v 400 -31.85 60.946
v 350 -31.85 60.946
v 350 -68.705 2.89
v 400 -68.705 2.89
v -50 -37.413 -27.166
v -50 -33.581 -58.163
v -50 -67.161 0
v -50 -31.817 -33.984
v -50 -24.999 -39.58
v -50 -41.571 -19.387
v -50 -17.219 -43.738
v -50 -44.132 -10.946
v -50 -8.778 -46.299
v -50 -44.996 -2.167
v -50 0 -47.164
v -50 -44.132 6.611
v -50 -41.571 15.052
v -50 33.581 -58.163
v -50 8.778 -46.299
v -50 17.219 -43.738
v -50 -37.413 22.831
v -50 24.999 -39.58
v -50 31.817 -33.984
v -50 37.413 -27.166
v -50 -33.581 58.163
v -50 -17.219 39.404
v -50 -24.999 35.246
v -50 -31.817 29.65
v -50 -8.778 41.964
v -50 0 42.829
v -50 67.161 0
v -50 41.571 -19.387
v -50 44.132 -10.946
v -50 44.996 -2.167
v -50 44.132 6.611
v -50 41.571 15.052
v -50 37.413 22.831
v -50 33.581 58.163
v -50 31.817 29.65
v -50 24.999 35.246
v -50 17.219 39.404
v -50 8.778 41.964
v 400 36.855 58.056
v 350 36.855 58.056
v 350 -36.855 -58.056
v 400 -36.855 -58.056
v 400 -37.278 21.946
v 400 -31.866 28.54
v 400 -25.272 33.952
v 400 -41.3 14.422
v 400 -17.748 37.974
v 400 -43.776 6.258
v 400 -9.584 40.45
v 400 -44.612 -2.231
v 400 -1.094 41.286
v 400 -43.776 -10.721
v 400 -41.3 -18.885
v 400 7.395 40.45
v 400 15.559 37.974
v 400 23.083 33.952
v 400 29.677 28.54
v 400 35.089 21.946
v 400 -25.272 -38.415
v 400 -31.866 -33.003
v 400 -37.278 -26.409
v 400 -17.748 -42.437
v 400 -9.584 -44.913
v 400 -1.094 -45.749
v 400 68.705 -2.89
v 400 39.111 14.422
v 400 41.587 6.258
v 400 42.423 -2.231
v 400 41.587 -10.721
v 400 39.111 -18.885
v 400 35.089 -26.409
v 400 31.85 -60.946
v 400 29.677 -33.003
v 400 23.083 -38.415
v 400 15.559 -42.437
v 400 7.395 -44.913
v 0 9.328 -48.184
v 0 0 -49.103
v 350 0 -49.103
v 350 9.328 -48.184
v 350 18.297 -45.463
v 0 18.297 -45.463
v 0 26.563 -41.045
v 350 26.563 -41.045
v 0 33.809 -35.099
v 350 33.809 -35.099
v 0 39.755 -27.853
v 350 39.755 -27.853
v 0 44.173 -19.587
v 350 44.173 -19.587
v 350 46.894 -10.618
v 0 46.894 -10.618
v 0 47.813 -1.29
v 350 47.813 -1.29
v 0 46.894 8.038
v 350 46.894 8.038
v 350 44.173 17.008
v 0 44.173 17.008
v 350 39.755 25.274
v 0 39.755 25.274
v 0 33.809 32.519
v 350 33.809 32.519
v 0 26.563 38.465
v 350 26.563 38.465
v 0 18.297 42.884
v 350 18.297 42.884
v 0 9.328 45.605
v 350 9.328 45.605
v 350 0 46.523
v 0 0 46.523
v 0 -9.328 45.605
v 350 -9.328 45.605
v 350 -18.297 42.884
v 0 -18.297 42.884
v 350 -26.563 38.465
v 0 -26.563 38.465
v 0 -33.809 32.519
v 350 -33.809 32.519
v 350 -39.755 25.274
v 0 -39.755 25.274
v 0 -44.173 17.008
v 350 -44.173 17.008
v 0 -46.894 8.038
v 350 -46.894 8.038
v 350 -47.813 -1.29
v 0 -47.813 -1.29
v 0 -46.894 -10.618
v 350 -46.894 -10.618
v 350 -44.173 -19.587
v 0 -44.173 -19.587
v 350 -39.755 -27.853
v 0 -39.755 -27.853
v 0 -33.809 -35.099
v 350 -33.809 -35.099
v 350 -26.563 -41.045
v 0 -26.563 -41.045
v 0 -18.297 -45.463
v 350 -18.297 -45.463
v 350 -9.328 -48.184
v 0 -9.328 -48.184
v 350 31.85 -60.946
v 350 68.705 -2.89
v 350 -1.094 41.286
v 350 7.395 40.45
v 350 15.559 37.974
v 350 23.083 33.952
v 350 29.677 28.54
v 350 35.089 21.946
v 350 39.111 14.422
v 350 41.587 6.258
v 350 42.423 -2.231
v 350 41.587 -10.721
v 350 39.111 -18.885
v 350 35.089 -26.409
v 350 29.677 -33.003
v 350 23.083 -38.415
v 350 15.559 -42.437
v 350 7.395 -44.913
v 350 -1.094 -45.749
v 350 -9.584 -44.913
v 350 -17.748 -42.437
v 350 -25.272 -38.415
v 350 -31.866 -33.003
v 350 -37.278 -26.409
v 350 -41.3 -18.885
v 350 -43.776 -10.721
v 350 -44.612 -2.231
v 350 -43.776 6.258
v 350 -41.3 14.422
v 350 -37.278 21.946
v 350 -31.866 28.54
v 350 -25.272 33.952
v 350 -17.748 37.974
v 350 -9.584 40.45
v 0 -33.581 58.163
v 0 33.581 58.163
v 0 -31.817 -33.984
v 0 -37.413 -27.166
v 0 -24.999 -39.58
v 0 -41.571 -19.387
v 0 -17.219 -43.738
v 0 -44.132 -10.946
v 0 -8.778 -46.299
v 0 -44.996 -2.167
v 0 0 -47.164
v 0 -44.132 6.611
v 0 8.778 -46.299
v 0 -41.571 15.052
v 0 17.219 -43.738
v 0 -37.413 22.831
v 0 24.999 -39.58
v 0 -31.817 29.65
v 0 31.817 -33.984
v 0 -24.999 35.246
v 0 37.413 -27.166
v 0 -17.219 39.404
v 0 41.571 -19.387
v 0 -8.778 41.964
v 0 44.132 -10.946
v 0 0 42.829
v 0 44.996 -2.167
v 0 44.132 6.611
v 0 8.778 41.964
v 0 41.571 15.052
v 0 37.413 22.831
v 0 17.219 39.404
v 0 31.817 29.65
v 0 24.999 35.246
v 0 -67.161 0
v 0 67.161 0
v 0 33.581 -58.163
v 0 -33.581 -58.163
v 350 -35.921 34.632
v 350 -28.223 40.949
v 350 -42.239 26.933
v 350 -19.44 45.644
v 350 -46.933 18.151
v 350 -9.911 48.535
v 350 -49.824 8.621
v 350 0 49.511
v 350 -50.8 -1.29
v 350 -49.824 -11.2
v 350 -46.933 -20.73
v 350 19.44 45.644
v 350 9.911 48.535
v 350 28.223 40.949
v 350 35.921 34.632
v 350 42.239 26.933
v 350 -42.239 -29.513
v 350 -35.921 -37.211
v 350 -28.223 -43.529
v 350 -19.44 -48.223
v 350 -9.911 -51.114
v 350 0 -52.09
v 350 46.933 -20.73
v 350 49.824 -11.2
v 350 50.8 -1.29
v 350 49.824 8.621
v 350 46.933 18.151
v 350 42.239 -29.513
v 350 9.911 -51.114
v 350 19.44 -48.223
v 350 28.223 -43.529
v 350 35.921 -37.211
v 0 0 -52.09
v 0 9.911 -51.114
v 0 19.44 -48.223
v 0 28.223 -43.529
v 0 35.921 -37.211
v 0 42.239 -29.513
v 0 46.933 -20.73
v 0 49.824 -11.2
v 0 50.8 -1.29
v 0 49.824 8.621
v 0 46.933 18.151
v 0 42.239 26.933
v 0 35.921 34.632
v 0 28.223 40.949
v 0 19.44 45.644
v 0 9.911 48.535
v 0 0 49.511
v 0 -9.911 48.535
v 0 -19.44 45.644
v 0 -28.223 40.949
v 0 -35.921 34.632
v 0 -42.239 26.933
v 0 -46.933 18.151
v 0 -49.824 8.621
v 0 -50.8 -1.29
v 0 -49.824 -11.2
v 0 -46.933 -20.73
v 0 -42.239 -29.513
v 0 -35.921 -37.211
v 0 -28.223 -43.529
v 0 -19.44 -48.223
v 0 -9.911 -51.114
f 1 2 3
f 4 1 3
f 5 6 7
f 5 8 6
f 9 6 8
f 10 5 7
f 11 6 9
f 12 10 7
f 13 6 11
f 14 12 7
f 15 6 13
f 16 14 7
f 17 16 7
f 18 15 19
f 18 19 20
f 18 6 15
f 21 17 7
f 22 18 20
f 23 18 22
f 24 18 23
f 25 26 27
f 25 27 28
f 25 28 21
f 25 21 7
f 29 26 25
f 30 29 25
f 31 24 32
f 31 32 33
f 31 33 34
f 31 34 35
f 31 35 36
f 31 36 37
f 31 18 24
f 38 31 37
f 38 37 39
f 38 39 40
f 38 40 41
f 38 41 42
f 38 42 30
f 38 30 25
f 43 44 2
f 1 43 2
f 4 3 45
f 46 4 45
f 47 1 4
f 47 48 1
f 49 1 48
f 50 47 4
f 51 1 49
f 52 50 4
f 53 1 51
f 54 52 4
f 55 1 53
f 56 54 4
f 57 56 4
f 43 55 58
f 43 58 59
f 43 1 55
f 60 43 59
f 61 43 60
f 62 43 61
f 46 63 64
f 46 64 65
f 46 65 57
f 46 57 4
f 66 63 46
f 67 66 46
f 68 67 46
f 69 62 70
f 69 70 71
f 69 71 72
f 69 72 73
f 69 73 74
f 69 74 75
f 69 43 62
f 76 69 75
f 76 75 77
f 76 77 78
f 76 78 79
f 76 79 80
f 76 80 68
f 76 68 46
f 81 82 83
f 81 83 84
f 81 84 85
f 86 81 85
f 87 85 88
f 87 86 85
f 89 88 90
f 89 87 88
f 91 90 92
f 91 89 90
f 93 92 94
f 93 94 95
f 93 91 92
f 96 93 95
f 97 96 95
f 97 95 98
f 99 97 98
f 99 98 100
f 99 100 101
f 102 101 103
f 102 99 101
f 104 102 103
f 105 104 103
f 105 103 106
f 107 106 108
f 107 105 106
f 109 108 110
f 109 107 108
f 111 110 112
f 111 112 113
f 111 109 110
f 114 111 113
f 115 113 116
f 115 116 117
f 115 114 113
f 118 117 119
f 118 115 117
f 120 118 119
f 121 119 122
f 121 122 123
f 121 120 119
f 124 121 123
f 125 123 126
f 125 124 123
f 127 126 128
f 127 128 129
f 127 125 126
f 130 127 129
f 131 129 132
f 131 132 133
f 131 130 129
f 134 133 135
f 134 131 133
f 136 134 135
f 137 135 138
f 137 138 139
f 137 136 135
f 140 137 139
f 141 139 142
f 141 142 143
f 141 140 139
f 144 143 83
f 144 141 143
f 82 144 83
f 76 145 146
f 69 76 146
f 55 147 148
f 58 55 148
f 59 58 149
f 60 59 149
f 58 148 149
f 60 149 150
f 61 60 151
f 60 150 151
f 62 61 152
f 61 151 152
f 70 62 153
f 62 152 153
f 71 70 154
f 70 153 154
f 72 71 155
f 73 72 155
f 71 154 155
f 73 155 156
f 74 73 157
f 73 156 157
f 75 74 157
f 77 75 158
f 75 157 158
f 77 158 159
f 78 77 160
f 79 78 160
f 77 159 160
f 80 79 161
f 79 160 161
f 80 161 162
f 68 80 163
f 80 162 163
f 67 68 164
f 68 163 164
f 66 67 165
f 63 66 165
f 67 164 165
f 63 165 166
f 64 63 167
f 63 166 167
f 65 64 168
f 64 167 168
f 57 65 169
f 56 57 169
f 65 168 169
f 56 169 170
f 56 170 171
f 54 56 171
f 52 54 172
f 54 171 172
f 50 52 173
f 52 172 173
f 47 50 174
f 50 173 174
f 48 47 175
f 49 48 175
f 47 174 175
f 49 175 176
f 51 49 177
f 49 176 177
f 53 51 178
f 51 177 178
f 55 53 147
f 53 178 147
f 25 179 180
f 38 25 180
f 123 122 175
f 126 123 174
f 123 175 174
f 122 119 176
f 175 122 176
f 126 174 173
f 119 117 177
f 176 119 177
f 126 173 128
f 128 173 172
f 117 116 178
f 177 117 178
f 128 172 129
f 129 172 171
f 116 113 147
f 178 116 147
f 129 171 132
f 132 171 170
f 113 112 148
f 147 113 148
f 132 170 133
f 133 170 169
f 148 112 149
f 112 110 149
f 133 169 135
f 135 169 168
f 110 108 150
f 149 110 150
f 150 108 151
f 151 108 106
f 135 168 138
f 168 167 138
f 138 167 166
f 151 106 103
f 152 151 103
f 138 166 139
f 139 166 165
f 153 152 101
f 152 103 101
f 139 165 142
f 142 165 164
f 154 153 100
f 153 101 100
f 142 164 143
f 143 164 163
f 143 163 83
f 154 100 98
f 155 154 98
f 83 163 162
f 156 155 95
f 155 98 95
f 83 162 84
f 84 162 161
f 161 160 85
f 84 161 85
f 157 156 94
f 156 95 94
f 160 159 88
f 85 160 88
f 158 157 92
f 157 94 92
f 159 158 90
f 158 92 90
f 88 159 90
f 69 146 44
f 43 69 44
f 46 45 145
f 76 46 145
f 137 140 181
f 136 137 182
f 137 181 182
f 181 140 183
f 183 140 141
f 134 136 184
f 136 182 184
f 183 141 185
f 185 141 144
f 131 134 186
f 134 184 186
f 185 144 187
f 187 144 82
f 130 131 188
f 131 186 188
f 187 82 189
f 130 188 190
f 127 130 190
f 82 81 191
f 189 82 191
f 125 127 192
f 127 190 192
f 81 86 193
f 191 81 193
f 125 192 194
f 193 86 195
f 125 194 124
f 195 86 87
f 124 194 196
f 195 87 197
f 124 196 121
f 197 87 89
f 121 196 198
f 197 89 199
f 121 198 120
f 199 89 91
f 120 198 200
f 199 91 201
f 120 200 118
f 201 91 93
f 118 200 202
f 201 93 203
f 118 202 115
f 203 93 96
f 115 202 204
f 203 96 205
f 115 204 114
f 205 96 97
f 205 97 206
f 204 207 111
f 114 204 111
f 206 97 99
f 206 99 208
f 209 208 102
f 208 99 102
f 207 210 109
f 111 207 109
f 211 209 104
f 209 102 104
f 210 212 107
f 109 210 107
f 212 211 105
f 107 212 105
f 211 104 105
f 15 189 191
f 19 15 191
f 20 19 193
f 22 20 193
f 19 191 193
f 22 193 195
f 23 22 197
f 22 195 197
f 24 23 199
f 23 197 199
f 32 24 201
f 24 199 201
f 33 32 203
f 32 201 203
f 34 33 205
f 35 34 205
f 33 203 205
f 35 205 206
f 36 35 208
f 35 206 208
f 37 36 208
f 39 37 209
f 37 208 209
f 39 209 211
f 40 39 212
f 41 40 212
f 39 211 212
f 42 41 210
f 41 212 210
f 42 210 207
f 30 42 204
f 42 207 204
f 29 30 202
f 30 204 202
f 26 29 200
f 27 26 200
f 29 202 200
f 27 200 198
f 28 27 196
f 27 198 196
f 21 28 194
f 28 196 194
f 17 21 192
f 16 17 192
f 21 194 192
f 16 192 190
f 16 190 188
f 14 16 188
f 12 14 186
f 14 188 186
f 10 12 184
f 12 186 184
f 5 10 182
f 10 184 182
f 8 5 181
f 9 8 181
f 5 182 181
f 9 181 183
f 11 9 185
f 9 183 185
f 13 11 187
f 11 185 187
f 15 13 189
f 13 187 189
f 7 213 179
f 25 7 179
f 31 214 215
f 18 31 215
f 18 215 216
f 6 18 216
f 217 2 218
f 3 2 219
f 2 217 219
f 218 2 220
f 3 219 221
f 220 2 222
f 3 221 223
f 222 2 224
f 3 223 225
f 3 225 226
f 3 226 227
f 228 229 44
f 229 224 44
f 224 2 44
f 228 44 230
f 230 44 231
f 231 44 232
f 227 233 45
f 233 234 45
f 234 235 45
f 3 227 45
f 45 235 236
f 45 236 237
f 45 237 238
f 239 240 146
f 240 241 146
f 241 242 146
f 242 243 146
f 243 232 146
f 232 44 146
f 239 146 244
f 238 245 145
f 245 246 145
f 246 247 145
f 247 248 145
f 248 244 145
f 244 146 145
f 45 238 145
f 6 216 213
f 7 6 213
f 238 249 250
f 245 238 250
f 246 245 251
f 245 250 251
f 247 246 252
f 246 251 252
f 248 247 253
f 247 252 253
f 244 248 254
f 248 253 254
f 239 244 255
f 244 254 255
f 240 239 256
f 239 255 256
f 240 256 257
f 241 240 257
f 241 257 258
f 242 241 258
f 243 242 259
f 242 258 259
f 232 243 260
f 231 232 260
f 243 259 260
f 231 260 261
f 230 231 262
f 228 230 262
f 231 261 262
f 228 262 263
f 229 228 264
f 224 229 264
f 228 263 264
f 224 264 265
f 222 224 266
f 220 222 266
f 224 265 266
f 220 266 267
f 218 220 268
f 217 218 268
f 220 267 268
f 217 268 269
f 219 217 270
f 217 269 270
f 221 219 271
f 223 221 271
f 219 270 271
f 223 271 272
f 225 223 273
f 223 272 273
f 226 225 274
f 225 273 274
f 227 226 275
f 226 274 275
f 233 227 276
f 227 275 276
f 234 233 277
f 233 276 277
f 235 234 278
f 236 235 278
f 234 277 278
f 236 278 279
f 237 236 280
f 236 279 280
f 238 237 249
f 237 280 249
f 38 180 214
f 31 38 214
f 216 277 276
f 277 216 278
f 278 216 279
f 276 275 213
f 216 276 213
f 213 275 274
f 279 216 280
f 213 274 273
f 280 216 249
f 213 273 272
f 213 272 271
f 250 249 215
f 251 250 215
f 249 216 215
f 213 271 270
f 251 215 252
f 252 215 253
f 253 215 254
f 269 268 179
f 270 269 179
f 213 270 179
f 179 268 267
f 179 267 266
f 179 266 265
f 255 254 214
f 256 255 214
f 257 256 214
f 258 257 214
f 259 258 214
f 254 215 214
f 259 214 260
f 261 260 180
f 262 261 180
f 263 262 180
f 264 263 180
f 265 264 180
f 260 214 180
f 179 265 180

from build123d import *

# Parameters (mm, degrees)
SKETCH1_R            = 50.800375113
SKETCH1_R_2          = 47.812951641
BOSS_EXTRUDE2_DEPTH  = 350
BOSS_EXTRUDE5_DEPTH  = 50
BOSS_EXTRUDE11_DEPTH = 50
SKETCH6_R            = 44.996318031
CUT_EXTRUDE2_DEPTH   = 50
SKETCH7_R            = 43.517898498
CUT_EXTRUDE3_DEPTH   = 50


with BuildPart() as part:
    # Sketch1 → Boss-Extrude2 (new body)
    with BuildSketch(Plane(origin=(0, 0, 0), x_dir=(0, 0, -1), z_dir=(1, 0, 0))):
        with Locations((1.289702318, 0)):
            Circle(SKETCH1_R)
        with Locations((1.289702318, 0)):
            Circle(SKETCH1_R_2, mode=Mode.SUBTRACT)
    extrude(amount=BOSS_EXTRUDE2_DEPTH)

    # Sketch3 → Boss-Extrude5 (add)
    with BuildSketch(Plane(origin=(350, 0, 0), x_dir=(0, 0, -1), z_dir=(1, 0, 0))):
        Polygon((58.055626726, -36.855405481), (60.945530776, 31.849944836), (2.88990405, 68.705350317), (-58.055626726, 36.855405481), (-60.945530776, -31.849944836), (-2.88990405, -68.705350317), align=None)
        Polygon((29.411876605, -18.99044871), (30.315925302, 11.383738416), (4.46313198, 27.353761118), (-22.293710039, 12.949596693), (-23.197758737, -17.424590433), (2.655034585, -33.394613135), align=None, mode=Mode.SUBTRACT)
    extrude(amount=BOSS_EXTRUDE5_DEPTH)

    # Sketch5 → Boss-Extrude11 (add)
    with BuildSketch(Plane.ZY):
        Polygon((0, -67.161353017), (58.163437865, -33.580676508), (58.163437865, 33.580676508), (0, 67.161353017), (-58.163437865, 33.580676508), (-58.163437865, -33.580676508), align=None)
    extrude(amount=BOSS_EXTRUDE11_DEPTH)

    # Sketch6 → Cut-Extrude2 (cut)
    with BuildSketch(Plane(origin=(0, 0, 0), x_dir=(0, 0, -1), z_dir=(1, 0, 0))):
        with Locations((2.167278034, 0)):
            Circle(SKETCH6_R)
    extrude(amount=-CUT_EXTRUDE2_DEPTH, mode=Mode.SUBTRACT)

    # Sketch7 → Cut-Extrude3 (cut)
    with BuildSketch(Plane.ZY.offset(-350)):
        with Locations((-2.231478452, -1.09442532)):
            Circle(SKETCH7_R)
    extrude(amount=-CUT_EXTRUDE3_DEPTH, mode=Mode.SUBTRACT)


solid = part.part
